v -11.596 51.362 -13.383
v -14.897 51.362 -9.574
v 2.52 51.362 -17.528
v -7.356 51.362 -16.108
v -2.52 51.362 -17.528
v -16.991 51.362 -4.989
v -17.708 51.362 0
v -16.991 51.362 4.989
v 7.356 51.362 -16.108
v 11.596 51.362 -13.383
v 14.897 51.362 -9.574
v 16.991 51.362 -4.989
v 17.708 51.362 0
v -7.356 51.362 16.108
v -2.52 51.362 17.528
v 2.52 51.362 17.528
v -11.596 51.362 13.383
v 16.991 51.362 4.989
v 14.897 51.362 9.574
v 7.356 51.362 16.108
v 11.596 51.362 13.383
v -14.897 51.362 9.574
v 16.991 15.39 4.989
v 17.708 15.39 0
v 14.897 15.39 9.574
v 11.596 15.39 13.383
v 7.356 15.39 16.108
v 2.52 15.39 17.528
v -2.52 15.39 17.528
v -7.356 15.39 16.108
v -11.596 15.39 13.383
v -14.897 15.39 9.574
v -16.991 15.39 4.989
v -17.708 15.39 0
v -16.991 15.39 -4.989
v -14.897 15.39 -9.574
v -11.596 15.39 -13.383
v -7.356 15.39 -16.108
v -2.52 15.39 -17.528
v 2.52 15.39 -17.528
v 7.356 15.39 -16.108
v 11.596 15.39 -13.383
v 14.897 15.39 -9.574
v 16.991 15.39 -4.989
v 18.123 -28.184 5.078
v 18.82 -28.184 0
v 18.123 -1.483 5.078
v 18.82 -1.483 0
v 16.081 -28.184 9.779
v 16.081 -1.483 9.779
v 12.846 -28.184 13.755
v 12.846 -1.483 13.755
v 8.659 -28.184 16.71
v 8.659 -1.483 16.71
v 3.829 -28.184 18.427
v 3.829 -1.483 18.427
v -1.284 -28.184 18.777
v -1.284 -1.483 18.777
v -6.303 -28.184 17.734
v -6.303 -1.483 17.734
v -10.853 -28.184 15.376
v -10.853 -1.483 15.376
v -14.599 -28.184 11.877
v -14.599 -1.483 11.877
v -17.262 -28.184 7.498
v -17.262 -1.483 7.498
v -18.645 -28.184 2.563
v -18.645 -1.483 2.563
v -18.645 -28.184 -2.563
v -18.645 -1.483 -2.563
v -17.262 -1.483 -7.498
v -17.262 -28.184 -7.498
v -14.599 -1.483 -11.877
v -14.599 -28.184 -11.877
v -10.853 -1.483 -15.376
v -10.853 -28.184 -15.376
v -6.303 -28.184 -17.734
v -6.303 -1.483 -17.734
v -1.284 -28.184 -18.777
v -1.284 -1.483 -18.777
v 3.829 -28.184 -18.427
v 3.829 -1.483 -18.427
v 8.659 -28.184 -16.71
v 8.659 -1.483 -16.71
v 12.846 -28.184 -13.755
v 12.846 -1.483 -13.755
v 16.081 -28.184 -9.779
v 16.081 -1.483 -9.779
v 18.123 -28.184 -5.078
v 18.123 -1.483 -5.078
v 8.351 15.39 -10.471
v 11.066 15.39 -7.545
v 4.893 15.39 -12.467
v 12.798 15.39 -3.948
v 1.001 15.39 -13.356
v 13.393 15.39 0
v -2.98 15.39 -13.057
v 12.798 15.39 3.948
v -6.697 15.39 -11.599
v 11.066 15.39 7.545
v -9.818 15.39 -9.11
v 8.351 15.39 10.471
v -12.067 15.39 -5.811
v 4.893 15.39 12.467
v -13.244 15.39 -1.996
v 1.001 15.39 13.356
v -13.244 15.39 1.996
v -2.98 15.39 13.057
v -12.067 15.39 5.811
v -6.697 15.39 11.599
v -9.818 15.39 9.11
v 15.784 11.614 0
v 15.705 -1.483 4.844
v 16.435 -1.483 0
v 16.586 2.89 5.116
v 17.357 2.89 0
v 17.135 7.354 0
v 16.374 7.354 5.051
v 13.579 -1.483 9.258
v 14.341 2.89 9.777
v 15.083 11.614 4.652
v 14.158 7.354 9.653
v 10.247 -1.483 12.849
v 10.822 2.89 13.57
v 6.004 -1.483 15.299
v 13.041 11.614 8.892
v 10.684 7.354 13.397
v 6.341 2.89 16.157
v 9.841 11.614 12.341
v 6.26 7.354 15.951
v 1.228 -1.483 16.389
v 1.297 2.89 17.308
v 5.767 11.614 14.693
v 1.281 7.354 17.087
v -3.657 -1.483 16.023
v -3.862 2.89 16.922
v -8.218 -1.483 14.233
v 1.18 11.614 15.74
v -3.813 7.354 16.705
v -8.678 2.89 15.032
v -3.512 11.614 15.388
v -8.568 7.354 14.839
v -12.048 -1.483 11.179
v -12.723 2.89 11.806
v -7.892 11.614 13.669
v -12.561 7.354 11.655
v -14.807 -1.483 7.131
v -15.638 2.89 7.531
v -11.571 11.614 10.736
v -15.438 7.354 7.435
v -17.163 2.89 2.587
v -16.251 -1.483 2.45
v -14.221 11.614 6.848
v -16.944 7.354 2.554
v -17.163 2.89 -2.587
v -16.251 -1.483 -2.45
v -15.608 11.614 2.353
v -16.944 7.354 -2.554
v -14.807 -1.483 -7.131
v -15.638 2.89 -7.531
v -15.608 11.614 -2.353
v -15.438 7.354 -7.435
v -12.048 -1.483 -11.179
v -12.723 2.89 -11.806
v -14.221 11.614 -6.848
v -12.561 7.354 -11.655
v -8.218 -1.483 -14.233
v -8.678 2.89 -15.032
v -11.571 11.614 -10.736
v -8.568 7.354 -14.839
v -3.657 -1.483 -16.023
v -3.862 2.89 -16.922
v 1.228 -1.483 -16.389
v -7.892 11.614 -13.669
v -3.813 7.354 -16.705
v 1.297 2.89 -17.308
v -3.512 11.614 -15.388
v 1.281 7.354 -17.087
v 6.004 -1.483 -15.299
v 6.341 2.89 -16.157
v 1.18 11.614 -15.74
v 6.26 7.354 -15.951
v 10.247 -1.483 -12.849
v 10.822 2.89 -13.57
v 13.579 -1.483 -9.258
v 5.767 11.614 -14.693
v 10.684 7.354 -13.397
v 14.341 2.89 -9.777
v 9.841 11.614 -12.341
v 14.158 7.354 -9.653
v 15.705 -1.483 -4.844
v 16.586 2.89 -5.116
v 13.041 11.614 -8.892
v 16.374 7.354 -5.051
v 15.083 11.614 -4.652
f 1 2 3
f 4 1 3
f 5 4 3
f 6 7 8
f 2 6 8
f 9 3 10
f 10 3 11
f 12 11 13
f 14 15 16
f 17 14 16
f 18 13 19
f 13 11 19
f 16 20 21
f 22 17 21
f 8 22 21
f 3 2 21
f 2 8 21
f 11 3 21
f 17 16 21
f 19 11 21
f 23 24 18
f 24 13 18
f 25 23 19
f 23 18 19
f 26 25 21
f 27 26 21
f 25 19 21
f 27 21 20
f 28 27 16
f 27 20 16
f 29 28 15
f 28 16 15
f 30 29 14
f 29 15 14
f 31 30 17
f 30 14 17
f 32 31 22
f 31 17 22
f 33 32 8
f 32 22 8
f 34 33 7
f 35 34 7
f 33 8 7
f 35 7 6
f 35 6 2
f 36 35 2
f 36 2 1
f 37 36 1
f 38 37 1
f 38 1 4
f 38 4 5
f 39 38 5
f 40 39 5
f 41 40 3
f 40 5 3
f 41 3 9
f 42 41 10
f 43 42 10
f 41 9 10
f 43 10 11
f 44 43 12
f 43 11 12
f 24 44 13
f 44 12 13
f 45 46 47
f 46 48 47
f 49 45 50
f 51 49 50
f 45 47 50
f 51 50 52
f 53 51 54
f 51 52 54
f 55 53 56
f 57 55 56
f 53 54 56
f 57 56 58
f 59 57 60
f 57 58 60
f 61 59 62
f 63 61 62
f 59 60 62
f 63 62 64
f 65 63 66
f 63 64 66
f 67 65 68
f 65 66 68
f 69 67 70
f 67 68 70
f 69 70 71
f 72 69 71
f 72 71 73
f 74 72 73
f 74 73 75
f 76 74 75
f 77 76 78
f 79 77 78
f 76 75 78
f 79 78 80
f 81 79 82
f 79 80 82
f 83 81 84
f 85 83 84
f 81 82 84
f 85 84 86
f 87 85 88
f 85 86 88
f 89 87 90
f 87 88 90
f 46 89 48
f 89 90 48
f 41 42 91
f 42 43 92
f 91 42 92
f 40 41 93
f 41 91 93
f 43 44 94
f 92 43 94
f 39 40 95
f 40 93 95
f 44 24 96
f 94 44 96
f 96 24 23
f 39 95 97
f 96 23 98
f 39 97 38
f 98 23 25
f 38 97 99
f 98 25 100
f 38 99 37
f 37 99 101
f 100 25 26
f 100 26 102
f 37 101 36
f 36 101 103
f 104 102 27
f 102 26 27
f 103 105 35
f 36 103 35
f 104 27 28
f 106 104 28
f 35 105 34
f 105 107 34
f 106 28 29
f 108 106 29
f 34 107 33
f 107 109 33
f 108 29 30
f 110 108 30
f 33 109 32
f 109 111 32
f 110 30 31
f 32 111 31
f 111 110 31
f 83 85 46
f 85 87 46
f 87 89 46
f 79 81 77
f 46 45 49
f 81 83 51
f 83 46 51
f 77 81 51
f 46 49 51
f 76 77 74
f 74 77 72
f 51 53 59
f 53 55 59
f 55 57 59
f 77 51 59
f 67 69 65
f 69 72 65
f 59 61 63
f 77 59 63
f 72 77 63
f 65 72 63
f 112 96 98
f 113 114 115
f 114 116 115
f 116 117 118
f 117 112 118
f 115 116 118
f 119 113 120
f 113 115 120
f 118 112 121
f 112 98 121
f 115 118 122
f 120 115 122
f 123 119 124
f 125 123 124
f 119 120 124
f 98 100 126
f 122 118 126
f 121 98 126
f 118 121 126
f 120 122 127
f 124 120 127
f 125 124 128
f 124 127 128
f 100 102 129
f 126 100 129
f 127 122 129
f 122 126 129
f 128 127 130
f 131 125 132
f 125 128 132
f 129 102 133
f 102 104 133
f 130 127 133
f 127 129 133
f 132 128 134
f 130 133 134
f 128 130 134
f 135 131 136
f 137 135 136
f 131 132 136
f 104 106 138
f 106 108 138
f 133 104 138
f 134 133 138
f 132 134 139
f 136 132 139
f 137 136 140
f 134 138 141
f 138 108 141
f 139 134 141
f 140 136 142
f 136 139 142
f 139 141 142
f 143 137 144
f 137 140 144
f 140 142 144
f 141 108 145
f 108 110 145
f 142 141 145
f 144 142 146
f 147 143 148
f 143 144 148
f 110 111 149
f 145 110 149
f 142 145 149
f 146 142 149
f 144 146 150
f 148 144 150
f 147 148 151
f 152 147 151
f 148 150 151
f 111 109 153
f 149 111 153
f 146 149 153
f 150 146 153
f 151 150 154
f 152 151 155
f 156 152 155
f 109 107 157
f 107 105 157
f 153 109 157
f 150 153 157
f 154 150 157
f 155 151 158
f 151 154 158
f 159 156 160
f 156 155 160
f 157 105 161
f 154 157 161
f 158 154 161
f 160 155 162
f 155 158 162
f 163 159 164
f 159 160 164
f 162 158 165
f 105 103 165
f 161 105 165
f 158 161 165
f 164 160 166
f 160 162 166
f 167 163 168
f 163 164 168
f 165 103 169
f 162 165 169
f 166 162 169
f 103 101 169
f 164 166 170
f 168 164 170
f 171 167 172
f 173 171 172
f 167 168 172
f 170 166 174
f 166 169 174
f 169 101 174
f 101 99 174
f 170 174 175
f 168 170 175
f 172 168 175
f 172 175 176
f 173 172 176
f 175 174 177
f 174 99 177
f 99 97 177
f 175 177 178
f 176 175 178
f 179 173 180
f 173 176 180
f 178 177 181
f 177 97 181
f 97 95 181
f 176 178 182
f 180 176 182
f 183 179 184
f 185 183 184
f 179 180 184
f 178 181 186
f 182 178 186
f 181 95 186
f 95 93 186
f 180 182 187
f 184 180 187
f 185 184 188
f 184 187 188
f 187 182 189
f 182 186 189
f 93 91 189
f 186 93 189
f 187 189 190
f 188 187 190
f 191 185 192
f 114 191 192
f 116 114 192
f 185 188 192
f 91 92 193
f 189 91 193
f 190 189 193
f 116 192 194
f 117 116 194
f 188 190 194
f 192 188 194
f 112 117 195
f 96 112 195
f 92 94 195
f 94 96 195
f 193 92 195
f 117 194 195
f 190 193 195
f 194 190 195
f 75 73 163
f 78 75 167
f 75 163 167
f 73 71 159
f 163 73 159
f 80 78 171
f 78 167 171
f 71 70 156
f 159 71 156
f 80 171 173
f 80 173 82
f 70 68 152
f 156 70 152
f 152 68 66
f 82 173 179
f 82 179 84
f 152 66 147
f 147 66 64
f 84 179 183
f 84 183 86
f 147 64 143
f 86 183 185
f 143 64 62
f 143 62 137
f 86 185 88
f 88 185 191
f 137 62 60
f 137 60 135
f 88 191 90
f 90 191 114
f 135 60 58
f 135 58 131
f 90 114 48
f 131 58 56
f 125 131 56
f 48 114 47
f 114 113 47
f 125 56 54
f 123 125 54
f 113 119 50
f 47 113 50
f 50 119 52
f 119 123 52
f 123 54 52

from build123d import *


with BuildPart() as f1:
    # F0 (on Top) → F1 (revolve)
    with BuildSketch(Plane.XY):
        with BuildLine():
            Line((13.393199, 15.390105), (17.707892, 15.390105))
            Line((17.707892, 15.390105), (17.707892, 51.362158))
            Line((17.707892, 51.362158), (0, 51.362158))
            Line((0, 51.362158), (0, -1.483383))
            Line((0, -1.483383), (0, -28.184287))
            Line((0, -28.184287), (18.820429, -28.184287))
            Line((18.820429, -28.184287), (18.820429, -1.483383))
            Line((18.820429, -1.483383), (16.435054, -1.483383))
            ThreePointArc((16.435054, -1.483383), (17.135046, 7.353735), (13.393199, 15.390105))
        make_face()
    revolve(axis=Axis((0, 7.880475, 0), (0, -1, 0)))


solid = f1.part
